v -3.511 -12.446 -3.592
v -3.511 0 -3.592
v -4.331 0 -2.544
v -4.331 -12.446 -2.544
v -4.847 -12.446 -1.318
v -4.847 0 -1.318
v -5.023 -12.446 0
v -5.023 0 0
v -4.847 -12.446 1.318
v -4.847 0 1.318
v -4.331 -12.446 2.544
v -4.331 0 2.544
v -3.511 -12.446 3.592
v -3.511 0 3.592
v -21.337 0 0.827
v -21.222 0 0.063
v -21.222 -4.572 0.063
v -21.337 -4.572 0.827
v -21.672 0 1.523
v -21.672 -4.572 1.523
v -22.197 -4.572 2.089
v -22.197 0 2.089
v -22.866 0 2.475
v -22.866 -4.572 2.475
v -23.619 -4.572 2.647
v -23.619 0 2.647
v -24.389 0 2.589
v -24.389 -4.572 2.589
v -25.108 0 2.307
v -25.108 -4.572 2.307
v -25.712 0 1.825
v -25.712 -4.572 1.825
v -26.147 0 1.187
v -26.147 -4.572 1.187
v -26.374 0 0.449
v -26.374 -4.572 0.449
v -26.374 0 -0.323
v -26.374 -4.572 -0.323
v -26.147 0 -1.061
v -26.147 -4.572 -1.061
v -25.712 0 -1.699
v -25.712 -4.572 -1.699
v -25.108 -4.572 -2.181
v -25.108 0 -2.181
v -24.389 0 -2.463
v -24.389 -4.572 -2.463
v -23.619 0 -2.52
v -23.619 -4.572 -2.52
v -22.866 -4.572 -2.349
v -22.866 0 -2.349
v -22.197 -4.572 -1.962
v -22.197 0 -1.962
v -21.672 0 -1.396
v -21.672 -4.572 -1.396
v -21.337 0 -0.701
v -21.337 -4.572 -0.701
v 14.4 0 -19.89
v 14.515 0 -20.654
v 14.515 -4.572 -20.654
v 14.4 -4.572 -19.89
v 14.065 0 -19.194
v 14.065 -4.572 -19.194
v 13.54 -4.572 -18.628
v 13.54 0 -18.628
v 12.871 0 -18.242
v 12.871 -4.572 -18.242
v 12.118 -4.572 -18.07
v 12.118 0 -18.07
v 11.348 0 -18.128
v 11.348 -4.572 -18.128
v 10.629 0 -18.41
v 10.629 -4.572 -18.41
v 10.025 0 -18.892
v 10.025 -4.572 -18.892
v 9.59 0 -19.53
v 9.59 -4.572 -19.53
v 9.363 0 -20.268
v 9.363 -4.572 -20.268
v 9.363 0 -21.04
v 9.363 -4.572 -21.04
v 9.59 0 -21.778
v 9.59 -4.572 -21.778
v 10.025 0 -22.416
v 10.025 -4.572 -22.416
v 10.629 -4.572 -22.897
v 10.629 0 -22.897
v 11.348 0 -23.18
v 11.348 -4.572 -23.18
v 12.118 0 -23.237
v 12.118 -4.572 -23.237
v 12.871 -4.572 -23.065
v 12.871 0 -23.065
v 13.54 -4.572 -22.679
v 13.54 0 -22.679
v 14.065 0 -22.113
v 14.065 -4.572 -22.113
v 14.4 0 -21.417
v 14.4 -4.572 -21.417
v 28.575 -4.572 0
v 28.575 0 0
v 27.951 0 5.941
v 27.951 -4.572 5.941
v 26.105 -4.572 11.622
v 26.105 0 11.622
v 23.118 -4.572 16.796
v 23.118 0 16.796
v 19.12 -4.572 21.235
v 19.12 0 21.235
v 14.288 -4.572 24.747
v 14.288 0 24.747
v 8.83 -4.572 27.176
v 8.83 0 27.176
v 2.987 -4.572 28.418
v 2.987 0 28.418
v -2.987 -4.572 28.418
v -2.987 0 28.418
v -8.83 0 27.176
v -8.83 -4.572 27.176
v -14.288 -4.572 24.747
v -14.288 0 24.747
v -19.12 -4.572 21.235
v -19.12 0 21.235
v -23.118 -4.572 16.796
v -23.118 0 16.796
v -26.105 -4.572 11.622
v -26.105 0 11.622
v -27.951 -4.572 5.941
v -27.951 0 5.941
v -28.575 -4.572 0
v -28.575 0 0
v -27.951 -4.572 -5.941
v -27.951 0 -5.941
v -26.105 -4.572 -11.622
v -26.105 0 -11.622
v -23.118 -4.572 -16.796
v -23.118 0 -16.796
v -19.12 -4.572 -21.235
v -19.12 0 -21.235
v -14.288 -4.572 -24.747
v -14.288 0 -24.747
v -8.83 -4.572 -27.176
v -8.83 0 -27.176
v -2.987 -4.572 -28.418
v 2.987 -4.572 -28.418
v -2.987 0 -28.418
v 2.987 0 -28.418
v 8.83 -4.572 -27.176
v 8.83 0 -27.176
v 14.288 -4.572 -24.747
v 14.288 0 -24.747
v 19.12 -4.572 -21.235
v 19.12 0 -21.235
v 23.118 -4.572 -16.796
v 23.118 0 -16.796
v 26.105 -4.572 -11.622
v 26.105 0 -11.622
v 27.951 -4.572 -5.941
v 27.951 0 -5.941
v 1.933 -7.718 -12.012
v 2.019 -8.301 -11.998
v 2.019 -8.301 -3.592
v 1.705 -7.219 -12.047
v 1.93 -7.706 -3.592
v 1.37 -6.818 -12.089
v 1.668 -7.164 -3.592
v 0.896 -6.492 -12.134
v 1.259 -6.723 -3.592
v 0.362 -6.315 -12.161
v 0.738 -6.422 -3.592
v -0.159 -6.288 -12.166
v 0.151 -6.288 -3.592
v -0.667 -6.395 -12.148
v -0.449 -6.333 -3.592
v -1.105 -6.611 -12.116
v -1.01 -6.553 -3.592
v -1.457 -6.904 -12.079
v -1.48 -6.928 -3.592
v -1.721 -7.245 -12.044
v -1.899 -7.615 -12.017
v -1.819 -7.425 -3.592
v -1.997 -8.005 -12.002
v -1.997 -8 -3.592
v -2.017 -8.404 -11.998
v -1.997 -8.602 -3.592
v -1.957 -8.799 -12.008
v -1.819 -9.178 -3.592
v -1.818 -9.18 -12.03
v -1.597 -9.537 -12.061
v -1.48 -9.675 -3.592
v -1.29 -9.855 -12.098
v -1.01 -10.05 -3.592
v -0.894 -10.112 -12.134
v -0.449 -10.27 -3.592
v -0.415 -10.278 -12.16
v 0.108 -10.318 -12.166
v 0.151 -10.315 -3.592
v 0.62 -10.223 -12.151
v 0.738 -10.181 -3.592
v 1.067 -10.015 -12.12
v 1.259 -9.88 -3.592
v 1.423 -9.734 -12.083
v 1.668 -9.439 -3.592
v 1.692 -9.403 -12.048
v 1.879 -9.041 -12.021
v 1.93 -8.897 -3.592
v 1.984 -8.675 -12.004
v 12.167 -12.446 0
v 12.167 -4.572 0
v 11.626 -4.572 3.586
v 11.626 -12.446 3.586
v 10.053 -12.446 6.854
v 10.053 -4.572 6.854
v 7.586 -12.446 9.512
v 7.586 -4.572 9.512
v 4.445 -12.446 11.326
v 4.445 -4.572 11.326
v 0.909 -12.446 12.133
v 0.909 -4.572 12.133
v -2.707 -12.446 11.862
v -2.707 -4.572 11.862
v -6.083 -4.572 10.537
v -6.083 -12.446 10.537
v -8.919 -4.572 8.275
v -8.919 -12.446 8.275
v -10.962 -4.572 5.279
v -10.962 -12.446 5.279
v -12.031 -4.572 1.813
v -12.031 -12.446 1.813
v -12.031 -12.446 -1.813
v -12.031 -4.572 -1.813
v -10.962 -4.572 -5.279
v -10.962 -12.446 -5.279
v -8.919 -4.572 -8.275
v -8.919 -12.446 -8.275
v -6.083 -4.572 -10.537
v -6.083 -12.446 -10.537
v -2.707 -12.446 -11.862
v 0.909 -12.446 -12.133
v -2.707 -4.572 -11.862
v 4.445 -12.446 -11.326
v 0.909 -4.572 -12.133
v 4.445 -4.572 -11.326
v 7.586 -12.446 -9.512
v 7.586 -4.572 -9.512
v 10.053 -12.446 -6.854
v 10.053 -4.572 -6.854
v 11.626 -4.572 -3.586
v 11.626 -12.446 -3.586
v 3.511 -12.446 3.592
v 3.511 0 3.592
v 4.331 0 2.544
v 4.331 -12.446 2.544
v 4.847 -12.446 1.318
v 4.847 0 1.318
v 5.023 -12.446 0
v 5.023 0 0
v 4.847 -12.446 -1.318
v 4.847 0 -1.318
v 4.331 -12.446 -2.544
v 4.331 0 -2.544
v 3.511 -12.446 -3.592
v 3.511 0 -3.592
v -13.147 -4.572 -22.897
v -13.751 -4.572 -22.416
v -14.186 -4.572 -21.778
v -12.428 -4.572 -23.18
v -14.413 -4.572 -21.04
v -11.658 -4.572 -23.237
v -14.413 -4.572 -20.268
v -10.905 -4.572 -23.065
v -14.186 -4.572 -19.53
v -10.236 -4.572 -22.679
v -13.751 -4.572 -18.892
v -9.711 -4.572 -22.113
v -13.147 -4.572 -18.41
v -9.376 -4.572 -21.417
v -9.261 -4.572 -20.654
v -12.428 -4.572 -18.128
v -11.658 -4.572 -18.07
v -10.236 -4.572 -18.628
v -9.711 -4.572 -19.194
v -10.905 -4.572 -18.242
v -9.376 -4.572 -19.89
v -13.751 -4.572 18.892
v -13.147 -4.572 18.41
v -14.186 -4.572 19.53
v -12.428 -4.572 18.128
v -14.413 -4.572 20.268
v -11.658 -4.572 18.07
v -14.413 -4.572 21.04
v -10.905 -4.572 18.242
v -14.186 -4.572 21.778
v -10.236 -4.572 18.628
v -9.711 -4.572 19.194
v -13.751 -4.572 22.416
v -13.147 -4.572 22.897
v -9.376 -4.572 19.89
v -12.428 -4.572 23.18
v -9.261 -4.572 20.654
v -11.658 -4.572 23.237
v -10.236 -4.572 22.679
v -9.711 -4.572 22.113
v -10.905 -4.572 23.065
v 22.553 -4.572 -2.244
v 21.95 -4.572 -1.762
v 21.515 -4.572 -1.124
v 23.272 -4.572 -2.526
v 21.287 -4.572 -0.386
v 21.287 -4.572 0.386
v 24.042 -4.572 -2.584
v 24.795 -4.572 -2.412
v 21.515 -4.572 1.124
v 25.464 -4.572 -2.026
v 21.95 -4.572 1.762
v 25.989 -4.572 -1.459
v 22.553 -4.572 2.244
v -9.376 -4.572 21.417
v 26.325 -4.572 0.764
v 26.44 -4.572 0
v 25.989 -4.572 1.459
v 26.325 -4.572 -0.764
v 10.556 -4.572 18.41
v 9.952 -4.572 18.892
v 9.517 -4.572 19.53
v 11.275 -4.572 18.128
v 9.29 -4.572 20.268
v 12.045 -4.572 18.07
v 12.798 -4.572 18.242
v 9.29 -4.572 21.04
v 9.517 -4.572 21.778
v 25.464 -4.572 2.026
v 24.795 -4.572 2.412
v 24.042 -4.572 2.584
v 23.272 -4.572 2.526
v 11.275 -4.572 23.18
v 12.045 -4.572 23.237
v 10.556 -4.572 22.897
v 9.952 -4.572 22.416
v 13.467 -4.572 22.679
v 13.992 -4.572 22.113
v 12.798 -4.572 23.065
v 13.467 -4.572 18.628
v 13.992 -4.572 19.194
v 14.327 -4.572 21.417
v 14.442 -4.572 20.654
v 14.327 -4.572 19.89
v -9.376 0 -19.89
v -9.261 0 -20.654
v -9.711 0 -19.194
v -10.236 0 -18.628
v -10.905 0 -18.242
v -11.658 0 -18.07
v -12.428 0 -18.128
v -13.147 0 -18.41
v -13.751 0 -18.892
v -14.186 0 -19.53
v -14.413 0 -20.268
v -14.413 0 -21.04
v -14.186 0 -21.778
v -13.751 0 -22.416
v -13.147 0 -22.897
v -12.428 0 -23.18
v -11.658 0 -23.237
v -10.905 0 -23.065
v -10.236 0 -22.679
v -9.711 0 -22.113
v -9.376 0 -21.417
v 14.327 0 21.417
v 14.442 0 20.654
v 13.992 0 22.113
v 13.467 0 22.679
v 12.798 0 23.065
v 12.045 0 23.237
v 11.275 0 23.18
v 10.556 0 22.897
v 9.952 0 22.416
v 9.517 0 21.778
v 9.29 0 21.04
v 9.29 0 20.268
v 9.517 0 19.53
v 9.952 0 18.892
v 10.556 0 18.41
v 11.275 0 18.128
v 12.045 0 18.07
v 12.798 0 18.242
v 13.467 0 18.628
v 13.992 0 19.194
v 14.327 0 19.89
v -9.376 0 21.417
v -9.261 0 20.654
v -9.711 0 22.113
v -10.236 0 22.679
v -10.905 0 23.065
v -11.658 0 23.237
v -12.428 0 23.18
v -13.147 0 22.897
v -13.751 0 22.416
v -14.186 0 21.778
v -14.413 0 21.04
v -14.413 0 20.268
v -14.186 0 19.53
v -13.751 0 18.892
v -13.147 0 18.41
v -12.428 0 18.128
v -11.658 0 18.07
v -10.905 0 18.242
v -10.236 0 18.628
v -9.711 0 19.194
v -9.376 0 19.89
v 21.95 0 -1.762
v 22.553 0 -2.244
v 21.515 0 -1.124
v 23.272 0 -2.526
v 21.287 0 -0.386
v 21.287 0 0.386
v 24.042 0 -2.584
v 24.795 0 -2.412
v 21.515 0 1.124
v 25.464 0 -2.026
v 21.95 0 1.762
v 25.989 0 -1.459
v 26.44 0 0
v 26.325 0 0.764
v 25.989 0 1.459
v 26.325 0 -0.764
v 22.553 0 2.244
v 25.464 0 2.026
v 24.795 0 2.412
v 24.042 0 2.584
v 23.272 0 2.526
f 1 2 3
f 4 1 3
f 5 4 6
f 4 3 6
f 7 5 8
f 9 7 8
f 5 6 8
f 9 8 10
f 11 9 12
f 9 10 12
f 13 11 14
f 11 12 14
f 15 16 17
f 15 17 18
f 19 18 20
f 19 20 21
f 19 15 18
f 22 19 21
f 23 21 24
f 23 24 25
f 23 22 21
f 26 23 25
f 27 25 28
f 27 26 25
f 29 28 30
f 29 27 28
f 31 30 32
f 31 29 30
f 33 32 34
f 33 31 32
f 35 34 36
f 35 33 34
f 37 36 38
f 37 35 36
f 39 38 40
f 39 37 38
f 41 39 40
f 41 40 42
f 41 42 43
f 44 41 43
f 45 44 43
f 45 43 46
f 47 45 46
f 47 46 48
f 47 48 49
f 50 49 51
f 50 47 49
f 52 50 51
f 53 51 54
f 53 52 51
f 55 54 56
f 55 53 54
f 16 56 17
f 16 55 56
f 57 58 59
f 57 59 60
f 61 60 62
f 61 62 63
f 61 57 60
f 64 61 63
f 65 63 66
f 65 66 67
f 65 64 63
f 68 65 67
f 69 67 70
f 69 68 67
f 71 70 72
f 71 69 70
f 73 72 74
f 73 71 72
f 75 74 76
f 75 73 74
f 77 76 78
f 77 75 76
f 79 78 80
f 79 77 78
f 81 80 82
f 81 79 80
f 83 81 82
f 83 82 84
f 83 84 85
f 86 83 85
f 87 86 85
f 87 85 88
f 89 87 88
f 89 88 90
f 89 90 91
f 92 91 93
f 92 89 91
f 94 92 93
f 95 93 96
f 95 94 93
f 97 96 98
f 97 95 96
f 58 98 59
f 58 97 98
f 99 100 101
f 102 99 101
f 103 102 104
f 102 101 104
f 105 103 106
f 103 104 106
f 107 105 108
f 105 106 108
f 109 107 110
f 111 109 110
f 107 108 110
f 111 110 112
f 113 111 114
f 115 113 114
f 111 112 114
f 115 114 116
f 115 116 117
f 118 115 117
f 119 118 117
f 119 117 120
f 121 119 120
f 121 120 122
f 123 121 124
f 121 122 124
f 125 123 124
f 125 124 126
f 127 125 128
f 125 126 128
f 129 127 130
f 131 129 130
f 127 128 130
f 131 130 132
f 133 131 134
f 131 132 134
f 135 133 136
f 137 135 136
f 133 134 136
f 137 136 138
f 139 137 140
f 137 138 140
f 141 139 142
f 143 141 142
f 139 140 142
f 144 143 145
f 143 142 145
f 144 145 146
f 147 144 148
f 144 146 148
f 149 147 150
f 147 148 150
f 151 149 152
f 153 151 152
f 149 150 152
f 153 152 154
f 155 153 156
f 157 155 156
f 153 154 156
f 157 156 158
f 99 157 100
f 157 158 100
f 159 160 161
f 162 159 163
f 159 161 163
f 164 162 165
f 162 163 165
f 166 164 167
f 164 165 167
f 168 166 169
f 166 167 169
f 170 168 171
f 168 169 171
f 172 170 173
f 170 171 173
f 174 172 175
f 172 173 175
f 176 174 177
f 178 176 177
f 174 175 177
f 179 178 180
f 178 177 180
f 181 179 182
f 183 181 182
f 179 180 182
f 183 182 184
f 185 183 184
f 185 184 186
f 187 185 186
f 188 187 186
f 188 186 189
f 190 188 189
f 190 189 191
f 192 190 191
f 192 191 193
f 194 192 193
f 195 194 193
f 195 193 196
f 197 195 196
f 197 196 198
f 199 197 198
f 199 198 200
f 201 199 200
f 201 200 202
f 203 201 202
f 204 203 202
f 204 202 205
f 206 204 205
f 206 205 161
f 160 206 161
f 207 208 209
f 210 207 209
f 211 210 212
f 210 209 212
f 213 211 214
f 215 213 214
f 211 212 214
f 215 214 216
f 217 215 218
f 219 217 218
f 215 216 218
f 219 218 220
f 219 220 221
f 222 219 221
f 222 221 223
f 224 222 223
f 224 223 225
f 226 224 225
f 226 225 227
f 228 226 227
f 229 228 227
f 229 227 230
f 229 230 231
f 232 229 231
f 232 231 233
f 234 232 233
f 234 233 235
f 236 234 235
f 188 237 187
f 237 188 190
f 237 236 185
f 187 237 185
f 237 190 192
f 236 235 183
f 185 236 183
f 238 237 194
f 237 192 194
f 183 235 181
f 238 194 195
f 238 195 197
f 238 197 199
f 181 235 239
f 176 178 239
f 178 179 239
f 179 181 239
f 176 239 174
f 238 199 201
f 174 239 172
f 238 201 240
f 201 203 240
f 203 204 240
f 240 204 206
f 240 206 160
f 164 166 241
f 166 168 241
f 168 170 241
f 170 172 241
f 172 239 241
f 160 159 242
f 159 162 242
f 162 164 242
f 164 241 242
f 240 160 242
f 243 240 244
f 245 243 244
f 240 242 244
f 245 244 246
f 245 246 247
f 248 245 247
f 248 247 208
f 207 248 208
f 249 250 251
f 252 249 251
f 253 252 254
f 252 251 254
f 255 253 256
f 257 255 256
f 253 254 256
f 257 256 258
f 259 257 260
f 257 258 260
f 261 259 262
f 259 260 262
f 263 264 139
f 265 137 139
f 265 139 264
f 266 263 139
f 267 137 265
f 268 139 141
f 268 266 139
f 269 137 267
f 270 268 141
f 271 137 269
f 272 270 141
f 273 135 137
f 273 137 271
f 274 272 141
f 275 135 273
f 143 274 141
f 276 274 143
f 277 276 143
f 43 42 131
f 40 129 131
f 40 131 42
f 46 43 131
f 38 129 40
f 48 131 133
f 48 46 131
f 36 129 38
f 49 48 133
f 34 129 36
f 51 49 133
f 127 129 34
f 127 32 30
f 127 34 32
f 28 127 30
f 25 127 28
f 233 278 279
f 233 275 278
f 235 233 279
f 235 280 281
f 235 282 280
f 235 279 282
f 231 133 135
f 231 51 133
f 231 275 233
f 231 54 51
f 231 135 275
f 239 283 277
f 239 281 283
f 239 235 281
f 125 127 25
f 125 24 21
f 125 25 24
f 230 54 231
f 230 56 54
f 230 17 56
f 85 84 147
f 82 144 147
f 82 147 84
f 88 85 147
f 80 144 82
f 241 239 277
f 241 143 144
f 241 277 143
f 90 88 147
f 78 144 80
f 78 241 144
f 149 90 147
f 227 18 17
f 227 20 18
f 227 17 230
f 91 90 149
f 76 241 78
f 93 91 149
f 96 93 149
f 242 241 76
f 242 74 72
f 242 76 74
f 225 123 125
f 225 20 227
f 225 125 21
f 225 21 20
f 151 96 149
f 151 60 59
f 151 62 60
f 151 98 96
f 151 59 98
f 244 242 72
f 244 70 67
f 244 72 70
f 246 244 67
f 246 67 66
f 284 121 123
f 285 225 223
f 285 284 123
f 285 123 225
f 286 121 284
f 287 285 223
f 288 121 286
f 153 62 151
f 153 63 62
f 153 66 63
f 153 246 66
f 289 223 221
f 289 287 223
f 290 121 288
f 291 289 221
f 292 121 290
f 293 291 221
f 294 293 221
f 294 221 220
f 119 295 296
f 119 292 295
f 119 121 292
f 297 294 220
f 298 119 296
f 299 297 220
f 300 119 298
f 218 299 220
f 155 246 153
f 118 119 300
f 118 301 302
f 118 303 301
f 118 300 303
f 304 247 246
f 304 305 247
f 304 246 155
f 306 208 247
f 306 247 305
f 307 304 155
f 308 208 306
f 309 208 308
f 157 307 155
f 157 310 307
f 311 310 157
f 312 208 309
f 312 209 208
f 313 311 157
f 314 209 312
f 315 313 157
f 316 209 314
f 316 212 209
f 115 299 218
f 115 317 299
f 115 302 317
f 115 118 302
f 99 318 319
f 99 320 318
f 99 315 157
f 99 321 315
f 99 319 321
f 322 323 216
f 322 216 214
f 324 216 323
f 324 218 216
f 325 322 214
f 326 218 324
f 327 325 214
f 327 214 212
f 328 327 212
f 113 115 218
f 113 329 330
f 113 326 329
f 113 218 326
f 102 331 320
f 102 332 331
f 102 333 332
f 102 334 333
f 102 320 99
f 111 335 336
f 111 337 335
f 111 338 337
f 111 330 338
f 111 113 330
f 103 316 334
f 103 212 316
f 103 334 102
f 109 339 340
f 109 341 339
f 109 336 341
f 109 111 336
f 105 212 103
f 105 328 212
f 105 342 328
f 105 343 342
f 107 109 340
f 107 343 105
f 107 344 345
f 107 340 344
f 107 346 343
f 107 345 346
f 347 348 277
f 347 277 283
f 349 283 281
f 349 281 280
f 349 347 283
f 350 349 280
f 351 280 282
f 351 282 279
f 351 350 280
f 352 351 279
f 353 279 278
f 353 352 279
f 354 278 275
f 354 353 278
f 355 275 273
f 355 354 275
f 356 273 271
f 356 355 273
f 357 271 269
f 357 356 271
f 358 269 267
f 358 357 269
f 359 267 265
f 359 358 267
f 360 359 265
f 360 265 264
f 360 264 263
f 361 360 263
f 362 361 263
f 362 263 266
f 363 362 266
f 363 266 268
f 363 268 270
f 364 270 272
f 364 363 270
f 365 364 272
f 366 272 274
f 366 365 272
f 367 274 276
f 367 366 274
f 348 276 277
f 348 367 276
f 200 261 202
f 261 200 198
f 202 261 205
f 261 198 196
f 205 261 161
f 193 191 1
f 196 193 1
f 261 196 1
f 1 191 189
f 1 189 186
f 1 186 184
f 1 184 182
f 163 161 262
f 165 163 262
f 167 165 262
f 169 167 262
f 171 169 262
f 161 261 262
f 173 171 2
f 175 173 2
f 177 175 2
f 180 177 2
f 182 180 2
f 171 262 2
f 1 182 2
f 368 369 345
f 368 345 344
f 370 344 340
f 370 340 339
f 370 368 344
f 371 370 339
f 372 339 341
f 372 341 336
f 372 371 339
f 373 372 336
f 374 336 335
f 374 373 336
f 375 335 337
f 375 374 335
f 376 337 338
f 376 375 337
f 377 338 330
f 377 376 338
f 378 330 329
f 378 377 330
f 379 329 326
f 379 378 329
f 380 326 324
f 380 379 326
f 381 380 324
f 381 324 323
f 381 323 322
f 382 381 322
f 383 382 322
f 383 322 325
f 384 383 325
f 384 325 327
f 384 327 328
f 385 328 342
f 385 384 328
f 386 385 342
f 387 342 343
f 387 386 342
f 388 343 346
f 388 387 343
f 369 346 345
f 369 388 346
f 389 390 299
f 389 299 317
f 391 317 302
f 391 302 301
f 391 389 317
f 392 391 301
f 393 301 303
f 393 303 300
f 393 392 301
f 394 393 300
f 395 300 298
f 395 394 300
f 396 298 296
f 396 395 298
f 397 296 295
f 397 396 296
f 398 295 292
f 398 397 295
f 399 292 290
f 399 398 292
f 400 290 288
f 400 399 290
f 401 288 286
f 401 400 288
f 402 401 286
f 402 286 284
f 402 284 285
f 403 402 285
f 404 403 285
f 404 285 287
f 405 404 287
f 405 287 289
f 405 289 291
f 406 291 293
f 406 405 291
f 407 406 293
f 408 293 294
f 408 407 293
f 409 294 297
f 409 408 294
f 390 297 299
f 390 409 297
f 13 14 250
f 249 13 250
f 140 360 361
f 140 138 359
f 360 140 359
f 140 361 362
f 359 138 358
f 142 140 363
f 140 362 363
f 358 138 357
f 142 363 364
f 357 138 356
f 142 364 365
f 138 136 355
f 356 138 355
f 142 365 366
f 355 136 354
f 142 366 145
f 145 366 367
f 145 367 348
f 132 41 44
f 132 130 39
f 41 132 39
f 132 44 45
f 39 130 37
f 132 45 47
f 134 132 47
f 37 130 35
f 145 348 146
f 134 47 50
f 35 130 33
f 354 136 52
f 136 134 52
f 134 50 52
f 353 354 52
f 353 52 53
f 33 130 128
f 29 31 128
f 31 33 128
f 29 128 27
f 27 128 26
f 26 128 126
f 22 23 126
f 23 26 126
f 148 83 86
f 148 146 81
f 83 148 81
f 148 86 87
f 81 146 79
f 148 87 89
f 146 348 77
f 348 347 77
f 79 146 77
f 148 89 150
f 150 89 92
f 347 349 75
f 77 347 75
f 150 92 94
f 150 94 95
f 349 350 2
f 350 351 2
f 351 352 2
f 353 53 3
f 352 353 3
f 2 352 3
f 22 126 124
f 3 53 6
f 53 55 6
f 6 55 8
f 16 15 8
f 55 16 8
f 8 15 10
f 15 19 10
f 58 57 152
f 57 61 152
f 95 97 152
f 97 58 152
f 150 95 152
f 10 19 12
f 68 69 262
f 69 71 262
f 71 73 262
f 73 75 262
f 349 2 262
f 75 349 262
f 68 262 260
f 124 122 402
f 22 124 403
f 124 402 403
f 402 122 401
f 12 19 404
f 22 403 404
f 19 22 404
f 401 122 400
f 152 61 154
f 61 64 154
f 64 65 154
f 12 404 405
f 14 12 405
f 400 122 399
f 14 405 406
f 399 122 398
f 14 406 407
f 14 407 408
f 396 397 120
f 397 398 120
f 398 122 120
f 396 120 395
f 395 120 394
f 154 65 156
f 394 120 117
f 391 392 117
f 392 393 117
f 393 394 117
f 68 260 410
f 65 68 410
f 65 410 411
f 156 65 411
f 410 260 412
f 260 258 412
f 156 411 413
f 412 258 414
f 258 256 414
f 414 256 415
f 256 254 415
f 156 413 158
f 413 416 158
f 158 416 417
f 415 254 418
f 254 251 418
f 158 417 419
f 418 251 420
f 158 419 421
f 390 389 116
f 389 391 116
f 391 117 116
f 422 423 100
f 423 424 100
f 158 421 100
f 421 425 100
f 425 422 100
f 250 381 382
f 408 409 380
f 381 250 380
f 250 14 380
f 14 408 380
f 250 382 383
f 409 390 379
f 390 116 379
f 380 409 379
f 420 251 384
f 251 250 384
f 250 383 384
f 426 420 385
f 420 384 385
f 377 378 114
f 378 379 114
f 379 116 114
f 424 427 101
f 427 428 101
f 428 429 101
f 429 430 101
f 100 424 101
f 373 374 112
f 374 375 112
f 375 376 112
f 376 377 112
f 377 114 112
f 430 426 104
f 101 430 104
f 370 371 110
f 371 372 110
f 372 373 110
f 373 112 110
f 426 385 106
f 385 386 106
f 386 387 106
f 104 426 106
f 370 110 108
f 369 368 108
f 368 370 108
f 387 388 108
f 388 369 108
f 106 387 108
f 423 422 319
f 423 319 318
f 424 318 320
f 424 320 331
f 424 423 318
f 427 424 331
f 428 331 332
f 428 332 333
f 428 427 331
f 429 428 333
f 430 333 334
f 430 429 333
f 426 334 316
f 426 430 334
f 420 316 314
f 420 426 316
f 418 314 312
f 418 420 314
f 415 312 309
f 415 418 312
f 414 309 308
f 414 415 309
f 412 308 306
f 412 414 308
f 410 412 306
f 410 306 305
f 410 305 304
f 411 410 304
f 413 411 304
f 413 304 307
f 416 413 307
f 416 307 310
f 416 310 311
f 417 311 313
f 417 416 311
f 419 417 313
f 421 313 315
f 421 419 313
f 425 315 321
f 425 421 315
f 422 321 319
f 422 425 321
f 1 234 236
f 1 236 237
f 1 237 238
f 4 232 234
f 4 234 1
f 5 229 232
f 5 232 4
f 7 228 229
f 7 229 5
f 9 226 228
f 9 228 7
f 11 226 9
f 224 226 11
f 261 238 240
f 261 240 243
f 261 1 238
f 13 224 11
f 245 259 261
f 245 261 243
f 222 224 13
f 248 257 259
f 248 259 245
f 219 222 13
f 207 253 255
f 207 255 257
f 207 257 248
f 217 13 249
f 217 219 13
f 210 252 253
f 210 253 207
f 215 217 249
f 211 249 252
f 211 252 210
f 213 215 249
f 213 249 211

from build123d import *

# Parameters (mm, degrees)
F0_R     = 12.1666
F1_DEPTH = 12.446
F0_R_2   = 28.575
F0_R_3   = 2.5908
F2_DEPTH = 4.572
F4_D     = 4.0386
F4_DEPTH = 28.576


with BuildPart() as f1:
    # F0 (on Front) → F1 (new body)
    with BuildSketch(Plane.XZ):
        Circle(F0_R)
        with BuildLine():
            ThreePointArc((-3.5111765908, -3.5917490267), (-5.02285, 0), (-3.5111765908, 3.5917490267))
            Line((-3.5111765908, 3.5917490267), (3.5111765908, 3.5917490267))
            ThreePointArc((3.5111765908, 3.5917490267), (5.02285, 0), (3.5111765908, -3.5917490267))
            Line((3.5111765908, -3.5917490267), (-3.5111765908, -3.5917490267))
        make_face(mode=Mode.SUBTRACT)
    extrude(amount=F1_DEPTH)

    # F0 (on Front) → F2 (join)
    with BuildSketch(Plane.XZ):
        Circle(F0_R_2)
        with Locations((-11.85156133, -20.6537079066)):
            Circle(F0_R_3, mode=Mode.SUBTRACT)
        with Locations((11.9244238196, -20.6537079066)):
            Circle(F0_R_3, mode=Mode.SUBTRACT)
        with Locations((-23.8124163945, 0.063100767)):
            Circle(F0_R_3, mode=Mode.SUBTRACT)
        with Locations((-11.85156133, 20.6537079066)):
            Circle(F0_R_3, mode=Mode.SUBTRACT)
        Circle(F0_R, mode=Mode.SUBTRACT)
        with Locations((23.8488476393, 0)):
            Circle(F0_R_3, mode=Mode.SUBTRACT)
        with Locations((11.85156133, 20.6537079066)):
            Circle(F0_R_3, mode=Mode.SUBTRACT)
    extrude(amount=F2_DEPTH)

    # F4 (through all, one way)
    with BuildSketch(Plane.XY):
        with Locations((0, -8.3013873111)):
            Circle(F4_D / 2)
    extrude(amount=-F4_DEPTH, mode=Mode.SUBTRACT)


solid = f1.part
